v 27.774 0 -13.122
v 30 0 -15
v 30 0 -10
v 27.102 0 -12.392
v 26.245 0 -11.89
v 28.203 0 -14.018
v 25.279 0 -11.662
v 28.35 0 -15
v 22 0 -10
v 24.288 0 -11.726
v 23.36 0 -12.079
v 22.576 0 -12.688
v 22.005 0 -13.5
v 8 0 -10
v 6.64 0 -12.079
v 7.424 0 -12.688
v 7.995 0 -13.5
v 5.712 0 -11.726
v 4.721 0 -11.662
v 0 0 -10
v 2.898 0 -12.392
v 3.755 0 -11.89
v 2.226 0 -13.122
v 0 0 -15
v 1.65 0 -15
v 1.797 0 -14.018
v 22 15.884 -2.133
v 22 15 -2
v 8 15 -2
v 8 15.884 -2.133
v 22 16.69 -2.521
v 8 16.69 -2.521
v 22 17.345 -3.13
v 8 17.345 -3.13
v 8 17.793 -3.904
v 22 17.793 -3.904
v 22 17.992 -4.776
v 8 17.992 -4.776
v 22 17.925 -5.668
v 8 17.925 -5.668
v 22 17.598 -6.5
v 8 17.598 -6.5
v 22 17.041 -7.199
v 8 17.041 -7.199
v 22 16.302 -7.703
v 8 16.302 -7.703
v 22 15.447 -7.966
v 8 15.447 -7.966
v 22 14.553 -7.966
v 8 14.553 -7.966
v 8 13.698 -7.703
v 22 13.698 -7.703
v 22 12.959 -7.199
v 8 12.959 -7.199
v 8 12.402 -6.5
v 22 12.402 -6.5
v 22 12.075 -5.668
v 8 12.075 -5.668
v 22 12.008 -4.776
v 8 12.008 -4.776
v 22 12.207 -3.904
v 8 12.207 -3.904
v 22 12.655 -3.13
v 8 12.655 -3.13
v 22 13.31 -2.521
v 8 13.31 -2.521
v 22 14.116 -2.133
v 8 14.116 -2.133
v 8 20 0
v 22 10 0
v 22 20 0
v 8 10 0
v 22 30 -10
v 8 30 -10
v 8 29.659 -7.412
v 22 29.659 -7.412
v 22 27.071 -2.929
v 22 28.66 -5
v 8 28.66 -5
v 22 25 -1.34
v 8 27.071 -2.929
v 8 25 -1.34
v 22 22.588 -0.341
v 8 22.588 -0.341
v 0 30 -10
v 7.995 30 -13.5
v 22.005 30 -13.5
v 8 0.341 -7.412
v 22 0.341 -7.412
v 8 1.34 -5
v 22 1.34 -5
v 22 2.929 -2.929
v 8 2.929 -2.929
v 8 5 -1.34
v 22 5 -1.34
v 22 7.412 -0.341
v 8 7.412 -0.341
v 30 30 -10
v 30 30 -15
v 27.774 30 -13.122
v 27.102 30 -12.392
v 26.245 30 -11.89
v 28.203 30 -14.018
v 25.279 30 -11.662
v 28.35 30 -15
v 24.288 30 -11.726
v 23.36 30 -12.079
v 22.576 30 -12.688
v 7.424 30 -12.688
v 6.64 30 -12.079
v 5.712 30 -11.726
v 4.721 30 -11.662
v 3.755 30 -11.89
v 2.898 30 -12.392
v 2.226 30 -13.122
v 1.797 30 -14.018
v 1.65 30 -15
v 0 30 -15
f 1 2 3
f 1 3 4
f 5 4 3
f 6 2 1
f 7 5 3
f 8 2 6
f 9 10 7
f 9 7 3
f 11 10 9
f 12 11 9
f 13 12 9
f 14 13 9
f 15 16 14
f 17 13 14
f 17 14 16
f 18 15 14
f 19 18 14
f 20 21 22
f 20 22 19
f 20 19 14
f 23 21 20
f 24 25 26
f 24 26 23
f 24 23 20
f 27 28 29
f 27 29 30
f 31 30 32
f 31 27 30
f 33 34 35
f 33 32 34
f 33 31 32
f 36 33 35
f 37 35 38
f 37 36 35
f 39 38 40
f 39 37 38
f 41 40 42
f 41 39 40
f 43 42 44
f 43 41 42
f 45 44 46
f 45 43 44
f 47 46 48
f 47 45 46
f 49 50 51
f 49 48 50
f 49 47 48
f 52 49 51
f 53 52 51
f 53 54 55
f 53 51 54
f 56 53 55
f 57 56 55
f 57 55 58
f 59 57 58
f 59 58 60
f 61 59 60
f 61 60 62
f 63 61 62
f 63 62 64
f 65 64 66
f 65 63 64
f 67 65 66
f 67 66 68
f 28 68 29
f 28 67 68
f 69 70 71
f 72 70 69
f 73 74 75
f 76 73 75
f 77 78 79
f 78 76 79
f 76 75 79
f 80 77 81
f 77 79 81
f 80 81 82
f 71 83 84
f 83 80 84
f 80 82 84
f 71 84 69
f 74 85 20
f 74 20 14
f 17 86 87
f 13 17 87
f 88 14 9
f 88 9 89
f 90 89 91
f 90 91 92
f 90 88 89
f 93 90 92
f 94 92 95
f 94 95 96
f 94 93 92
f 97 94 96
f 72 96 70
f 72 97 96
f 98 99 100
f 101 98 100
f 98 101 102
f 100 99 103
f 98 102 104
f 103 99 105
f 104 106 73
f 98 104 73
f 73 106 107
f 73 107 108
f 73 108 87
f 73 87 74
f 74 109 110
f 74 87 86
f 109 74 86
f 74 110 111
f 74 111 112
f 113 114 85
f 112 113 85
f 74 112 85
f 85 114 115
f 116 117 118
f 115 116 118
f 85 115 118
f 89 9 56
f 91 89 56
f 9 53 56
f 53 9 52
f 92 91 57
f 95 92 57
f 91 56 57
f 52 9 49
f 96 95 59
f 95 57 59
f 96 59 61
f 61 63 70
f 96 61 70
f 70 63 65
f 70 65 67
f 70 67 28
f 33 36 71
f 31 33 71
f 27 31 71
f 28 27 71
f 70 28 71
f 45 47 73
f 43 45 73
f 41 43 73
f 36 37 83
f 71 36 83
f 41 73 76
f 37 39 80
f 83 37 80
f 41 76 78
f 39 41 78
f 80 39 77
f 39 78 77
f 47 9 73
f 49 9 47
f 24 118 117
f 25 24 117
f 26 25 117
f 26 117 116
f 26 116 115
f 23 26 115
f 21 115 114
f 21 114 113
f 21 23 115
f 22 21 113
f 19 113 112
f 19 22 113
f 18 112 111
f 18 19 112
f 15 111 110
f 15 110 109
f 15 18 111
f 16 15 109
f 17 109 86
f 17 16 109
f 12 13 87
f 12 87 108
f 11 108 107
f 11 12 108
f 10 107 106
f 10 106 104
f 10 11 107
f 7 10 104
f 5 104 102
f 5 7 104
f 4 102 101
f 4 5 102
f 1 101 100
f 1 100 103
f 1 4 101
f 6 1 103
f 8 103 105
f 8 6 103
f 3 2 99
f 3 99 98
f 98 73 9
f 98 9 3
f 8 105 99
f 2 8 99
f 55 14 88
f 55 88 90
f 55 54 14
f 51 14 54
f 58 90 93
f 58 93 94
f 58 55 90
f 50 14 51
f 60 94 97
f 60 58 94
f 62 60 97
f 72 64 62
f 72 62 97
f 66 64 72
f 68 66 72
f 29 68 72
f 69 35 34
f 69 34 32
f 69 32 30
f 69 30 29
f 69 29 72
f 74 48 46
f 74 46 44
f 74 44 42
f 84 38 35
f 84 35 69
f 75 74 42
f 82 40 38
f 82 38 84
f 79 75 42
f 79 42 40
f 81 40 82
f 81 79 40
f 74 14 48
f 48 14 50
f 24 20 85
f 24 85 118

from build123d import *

# Parameters (mm, degrees)
BOSS_EXTRUDE1_DEPTH     = 30
CUT_EXTRUDE2_DEPTH      = 46
CUT_EXTRUDE2_DEPTH_BACK = 46
SKETCH3_R               = 3
CUT_EXTRUDE3_DEPTH      = 46
CUT_EXTRUDE3_DEPTH_BACK = 46
SKETCH4_W               = 15.866839518
SKETCH4_H               = 1.721603904
FILLET1_R               = 10
CUT_EXTRUDE4_DEPTH      = 46
CUT_EXTRUDE4_DEPTH_BACK = 46
SKETCH5_W               = 8
SKETCH5_H               = 10


with BuildPart() as part:
    # Sketch1 → Boss-Extrude1 (new body)
    with BuildSketch(Plane(origin=(0, 0, 0), x_dir=(1, 0, 0), z_dir=(0, 1, 0))):
        with BuildLine():
            Line((8.35, 15), (21.65, 15))
            ThreePointArc((21.65, 15), (25, 11.65), (28.35, 15))
            Line((28.35, 15), (30, 15))
            Line((30, 15), (30, 0))
            Line((30, 0), (0, 0))
            Line((0, 0), (0, 15))
            Line((0, 15), (1.65, 15))
            ThreePointArc((1.65, 15), (5, 11.65), (8.35, 15))
        make_face()
    extrude(amount=BOSS_EXTRUDE1_DEPTH)

    # Sketch3 → Cut-Extrude2 (cut, two sides: drawn at the far end of the back side and taken through both)
    with BuildSketch(Plane.ZY.offset(-CUT_EXTRUDE2_DEPTH_BACK)):
        with Locations((-5, 15)):
            Circle(SKETCH3_R)
    extrude(amount=CUT_EXTRUDE2_DEPTH + CUT_EXTRUDE2_DEPTH_BACK, mode=Mode.SUBTRACT)

    # Sketch4 → Cut-Extrude3 (cut, two sides: drawn at the far end of the back side and taken through both)
    with BuildSketch(Plane.XZ.offset(-CUT_EXTRUDE3_DEPTH_BACK)):
        with Locations((14.711914925, -14.360801952)):
            Rectangle(SKETCH4_W, SKETCH4_H)
    extrude(amount=CUT_EXTRUDE3_DEPTH + CUT_EXTRUDE3_DEPTH_BACK, mode=Mode.SUBTRACT)

    # Fillet1
    fillet1_edges = [part.edges().sort_by_distance(p)[0] for p in [
        (15, 0, 0),
        (15, 30, 0),
    ]]
    fillet(fillet1_edges, radius=FILLET1_R)

    # Sketch5 → Cut-Extrude4 (cut, two sides: drawn at the far end of the back side and taken through both)
    with BuildSketch(Plane.XZ.offset(-CUT_EXTRUDE4_DEPTH_BACK)):
        with Locations((4, -5)):
            Rectangle(SKETCH5_W, SKETCH5_H)
        with Locations((26, -5)):
            Rectangle(SKETCH5_W, SKETCH5_H)
    extrude(amount=CUT_EXTRUDE4_DEPTH + CUT_EXTRUDE4_DEPTH_BACK, mode=Mode.SUBTRACT)


solid = part.part
